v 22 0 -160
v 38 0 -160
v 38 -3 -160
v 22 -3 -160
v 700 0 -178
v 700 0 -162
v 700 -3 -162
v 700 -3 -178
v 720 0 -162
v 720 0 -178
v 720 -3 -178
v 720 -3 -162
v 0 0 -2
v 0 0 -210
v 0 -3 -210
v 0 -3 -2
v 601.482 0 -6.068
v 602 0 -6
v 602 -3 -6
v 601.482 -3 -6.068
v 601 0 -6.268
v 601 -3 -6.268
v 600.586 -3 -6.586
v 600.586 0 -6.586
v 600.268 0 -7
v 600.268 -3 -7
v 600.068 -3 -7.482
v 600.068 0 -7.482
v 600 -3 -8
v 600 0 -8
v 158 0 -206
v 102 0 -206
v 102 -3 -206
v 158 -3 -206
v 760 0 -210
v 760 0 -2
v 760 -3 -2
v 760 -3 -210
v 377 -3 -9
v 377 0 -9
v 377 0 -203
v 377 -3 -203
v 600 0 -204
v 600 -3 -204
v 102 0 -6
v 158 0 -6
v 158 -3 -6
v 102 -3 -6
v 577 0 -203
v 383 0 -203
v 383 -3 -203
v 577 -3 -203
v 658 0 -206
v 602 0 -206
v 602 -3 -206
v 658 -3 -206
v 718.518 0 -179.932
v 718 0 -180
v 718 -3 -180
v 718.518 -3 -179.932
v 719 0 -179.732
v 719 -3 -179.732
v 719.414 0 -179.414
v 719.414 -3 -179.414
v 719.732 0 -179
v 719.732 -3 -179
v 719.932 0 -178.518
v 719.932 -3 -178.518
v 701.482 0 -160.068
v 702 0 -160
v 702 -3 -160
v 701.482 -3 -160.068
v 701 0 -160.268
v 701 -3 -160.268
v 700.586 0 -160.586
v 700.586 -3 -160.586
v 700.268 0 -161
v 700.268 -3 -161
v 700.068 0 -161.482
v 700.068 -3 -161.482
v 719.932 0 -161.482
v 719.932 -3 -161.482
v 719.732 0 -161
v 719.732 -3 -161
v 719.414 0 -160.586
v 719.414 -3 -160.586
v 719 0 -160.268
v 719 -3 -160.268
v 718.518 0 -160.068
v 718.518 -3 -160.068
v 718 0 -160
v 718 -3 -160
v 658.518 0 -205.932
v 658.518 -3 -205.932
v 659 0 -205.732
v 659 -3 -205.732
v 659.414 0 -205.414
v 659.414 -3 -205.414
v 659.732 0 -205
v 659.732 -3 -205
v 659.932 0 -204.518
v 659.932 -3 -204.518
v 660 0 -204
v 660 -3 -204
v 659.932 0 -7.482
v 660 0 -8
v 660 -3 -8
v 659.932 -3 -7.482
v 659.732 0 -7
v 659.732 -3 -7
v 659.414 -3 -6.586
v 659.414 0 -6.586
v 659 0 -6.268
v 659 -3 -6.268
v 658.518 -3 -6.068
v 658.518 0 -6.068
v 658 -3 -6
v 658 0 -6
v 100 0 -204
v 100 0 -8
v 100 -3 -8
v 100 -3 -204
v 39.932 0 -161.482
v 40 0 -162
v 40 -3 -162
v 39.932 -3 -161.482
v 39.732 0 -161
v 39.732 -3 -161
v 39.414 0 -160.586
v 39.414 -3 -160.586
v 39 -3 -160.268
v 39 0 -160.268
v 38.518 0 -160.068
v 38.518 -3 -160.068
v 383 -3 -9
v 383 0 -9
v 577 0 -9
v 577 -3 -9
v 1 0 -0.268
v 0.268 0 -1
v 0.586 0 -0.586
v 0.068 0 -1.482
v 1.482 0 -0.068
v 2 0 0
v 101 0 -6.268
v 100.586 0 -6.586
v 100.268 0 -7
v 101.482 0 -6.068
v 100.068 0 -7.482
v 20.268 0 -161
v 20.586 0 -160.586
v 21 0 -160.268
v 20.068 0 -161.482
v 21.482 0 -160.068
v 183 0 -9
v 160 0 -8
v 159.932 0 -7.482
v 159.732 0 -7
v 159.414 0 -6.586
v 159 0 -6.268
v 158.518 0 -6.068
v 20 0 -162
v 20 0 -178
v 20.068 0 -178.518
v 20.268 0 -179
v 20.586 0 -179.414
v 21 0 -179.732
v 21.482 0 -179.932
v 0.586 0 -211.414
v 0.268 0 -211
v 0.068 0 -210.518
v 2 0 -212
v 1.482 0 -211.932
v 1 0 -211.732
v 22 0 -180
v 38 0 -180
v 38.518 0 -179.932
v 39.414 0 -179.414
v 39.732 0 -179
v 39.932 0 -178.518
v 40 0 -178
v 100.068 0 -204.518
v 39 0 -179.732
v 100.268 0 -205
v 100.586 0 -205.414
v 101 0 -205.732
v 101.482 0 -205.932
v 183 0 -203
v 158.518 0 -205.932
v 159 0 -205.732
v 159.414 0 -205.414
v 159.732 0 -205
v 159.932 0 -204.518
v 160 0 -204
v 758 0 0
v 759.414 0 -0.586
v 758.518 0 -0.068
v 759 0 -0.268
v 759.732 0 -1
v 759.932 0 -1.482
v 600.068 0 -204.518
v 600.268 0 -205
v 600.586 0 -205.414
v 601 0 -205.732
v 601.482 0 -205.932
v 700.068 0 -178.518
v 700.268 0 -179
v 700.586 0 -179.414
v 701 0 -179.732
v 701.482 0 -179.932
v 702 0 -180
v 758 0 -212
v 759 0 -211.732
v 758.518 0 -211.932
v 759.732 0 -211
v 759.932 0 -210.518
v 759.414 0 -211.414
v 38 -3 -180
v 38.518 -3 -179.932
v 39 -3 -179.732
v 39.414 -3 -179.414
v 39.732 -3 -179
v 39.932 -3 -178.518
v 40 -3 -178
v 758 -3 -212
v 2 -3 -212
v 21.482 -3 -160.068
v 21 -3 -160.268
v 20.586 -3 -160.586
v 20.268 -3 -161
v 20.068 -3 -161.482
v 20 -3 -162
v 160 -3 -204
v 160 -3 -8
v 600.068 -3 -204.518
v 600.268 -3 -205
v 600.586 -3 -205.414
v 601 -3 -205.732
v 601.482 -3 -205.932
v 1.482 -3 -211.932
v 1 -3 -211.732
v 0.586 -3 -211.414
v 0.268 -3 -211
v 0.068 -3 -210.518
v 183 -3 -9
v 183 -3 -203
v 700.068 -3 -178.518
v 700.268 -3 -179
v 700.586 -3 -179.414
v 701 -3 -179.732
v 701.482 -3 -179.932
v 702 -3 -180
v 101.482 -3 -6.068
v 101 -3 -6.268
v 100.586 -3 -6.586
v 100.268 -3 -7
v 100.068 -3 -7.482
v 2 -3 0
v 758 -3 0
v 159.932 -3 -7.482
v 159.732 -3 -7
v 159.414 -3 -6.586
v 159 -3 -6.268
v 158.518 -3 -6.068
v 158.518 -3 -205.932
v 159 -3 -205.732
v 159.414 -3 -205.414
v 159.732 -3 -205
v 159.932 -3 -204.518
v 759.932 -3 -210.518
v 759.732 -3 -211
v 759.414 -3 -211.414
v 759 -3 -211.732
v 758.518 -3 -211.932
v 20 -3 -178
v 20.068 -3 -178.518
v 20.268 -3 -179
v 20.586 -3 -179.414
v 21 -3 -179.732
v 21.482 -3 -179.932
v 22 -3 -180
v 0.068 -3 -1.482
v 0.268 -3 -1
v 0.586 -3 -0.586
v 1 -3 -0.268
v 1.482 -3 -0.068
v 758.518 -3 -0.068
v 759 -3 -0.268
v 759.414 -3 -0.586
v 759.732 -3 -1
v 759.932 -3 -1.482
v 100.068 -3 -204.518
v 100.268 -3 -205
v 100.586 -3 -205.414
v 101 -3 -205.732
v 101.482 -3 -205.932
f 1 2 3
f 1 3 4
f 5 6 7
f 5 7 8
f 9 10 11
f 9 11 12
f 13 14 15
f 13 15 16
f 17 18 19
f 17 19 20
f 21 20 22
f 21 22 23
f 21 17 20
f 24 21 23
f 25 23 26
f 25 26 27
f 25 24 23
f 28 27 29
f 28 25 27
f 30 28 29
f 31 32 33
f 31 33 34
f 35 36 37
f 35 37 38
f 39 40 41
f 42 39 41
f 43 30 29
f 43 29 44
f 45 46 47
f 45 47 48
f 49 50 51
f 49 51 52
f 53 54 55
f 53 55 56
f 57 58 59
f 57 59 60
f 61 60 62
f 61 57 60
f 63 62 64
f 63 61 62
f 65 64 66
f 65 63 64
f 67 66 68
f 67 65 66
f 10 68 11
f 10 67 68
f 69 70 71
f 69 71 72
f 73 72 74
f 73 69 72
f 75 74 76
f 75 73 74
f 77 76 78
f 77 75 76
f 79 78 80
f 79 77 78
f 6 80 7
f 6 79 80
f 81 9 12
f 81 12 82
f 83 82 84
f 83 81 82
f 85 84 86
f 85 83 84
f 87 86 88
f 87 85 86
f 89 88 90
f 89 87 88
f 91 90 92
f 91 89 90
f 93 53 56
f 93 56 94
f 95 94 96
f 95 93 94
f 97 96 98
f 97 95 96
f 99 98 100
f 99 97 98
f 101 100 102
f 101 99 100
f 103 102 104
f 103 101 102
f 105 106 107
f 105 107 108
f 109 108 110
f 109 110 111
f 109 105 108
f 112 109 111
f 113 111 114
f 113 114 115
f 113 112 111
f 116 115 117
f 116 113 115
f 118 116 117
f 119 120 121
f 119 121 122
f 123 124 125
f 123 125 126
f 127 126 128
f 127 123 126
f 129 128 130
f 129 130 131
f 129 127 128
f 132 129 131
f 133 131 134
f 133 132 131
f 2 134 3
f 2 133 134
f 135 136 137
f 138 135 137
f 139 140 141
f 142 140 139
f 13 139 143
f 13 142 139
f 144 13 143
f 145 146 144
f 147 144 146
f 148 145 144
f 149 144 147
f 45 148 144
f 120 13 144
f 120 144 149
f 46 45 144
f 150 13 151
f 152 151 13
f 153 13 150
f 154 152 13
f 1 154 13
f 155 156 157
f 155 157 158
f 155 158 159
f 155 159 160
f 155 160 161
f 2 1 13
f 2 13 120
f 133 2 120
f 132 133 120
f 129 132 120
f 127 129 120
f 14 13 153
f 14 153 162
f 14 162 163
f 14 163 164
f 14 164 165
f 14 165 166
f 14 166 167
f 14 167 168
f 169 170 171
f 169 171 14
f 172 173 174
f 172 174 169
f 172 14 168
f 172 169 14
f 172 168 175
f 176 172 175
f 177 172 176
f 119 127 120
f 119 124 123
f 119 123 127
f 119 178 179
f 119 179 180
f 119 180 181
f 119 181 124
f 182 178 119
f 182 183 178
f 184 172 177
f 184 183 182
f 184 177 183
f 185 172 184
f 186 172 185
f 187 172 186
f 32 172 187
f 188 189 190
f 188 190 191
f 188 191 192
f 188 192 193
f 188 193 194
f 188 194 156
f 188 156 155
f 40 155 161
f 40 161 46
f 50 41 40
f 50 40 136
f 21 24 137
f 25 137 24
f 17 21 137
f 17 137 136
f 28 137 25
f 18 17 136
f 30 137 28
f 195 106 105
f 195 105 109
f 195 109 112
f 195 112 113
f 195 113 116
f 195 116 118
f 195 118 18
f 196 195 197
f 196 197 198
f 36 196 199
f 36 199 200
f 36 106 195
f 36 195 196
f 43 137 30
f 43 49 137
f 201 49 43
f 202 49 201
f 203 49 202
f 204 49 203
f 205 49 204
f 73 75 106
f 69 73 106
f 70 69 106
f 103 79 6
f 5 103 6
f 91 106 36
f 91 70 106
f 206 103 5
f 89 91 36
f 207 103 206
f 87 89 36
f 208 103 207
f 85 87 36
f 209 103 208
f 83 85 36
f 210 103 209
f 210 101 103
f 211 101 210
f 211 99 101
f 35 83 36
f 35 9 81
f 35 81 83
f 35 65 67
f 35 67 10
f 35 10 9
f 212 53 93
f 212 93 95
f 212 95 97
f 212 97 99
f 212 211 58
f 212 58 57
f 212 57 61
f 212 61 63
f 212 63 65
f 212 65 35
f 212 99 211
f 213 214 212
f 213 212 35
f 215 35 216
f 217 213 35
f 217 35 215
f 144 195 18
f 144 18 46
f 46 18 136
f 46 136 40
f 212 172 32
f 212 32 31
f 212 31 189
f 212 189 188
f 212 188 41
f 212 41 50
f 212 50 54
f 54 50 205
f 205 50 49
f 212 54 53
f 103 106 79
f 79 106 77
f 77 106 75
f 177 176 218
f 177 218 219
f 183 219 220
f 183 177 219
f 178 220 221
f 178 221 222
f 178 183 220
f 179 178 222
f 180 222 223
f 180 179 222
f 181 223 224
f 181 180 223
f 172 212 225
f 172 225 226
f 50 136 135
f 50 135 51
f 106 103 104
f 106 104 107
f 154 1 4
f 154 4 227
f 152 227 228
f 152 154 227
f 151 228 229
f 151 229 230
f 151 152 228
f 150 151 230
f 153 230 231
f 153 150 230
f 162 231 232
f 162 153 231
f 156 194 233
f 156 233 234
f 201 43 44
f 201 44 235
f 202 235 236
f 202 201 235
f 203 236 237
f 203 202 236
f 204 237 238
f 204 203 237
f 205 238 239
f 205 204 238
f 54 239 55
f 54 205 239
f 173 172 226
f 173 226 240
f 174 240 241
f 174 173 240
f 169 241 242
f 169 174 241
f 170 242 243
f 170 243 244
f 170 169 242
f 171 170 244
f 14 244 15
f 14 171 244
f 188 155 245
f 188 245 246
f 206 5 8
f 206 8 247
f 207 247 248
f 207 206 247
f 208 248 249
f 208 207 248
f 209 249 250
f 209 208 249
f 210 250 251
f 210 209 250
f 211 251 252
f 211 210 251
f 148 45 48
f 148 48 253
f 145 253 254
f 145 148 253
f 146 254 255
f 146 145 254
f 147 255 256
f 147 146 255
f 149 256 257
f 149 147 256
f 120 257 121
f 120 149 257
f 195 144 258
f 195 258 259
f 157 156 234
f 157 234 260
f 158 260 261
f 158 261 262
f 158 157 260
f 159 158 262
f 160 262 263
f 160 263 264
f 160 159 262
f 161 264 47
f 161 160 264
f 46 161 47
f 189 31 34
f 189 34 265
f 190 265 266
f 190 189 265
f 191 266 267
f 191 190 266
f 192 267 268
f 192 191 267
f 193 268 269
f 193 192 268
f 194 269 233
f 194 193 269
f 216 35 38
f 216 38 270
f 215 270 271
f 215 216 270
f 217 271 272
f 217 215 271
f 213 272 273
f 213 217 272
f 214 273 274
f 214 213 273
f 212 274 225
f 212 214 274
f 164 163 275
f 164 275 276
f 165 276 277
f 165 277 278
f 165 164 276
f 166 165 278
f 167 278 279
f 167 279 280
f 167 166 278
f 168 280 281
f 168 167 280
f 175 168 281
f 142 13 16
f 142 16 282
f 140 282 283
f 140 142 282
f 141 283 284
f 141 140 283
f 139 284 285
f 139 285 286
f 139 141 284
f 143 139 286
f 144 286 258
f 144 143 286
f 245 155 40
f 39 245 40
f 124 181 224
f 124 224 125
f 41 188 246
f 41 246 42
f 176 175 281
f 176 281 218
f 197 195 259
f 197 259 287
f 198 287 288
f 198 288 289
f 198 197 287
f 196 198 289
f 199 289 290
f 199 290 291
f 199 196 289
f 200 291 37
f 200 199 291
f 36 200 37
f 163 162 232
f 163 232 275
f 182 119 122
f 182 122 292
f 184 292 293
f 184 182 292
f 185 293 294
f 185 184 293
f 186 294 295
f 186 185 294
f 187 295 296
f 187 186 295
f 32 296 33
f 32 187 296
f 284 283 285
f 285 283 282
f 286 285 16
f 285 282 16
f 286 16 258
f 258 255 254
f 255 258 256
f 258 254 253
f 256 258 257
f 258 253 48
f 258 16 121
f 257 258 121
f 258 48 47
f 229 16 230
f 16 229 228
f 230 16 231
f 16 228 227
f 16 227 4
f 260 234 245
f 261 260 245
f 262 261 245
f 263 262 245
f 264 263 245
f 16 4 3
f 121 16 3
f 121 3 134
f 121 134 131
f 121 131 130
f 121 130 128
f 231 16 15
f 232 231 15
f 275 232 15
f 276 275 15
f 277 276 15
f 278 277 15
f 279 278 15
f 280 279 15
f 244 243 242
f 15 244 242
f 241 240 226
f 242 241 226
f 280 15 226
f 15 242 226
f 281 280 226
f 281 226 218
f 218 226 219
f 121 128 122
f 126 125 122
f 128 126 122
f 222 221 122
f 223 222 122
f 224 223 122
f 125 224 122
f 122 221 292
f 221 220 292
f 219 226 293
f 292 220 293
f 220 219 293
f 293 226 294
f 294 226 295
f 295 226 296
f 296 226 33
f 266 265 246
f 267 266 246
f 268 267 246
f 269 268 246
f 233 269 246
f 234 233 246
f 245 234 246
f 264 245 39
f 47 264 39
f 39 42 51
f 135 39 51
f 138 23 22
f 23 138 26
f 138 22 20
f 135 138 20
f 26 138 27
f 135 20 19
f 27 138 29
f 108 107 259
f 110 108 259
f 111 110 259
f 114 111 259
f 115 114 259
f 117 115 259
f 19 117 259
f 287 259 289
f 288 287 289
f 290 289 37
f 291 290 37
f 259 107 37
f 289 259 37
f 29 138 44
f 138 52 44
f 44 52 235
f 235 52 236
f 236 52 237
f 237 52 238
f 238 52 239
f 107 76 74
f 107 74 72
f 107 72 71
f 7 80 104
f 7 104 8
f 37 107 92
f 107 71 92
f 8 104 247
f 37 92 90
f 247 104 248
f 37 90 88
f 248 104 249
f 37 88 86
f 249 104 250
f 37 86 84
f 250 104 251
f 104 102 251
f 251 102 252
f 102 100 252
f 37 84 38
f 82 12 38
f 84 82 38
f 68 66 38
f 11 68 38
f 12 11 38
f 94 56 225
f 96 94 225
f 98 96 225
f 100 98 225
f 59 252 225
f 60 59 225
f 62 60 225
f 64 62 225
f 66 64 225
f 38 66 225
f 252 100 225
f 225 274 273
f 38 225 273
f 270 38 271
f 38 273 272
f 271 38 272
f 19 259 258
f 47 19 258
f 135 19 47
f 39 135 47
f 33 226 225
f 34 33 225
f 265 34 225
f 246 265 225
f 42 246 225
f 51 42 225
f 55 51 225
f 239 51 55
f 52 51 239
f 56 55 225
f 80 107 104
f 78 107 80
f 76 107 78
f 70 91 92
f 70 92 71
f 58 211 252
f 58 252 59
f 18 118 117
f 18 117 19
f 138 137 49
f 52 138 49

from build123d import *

# Parameters (mm, degrees)
SKETCH_1_W      = 194
SKETCH_1_H      = 194
EXTRUDE_1_DEPTH = 3


with BuildPart() as part:
    # 草图1 → 凸台-拉伸1 (new body)
    with BuildSketch(Plane(origin=(0, 0, 0), x_dir=(1, 0, 0), z_dir=(0, 1, 0))):
        with BuildLine():
            Line((2, 0), (758, 0))
            ThreePointArc((758, 0), (759.414213562, 0.585786438), (760, 2))
            Line((760, 2), (760, 210))
            ThreePointArc((760, 210), (759.414213562, 211.414213562), (758, 212))
            Line((758, 212), (2, 212))
            ThreePointArc((2, 212), (0.585786438, 211.414213562), (0, 210))
            Line((0, 210), (0, 2))
            ThreePointArc((0, 2), (0.585786438, 0.585786438), (2, 0))
        make_face()
        with Locations((480, 106)):
            Rectangle(SKETCH_1_W, SKETCH_1_H, mode=Mode.SUBTRACT)
        with Locations((280, 106)):
            Rectangle(SKETCH_1_W, SKETCH_1_H, mode=Mode.SUBTRACT)
        with BuildLine():
            Line((658, 6), (602, 6))
            ThreePointArc((602, 6), (600.585786438, 6.585786438), (600, 8))
            Line((600, 8), (600, 204))
            ThreePointArc((600, 204), (600.585786438, 205.414213562), (602, 206))
            Line((602, 206), (658, 206))
            ThreePointArc((658, 206), (659.414213562, 205.414213562), (660, 204))
            Line((660, 204), (660, 8))
            ThreePointArc((660, 8), (659.414213562, 6.585786438), (658, 6))
        make_face(mode=Mode.SUBTRACT)
        with BuildLine():
            Line((158, 6), (102, 6))
            ThreePointArc((102, 6), (100.585786438, 6.585786438), (100, 8))
            Line((100, 8), (100, 204))
            ThreePointArc((100, 204), (100.585786438, 205.414213562), (102, 206))
            Line((102, 206), (158, 206))
            ThreePointArc((158, 206), (159.414213562, 205.414213562), (160, 204))
            Line((160, 204), (160, 8))
            ThreePointArc((160, 8), (159.414213562, 6.585786438), (158, 6))
        make_face(mode=Mode.SUBTRACT)
        with BuildLine():
            Line((718, 160), (702, 160))
            ThreePointArc((702, 160), (700.585786438, 160.585786438), (700, 162))
            Line((700, 162), (700, 178))
            ThreePointArc((700, 178), (700.585786438, 179.414213562), (702, 180))
            Line((702, 180), (718, 180))
            ThreePointArc((718, 180), (719.414213562, 179.414213562), (720, 178))
            Line((720, 178), (720, 162))
            ThreePointArc((720, 162), (719.414213562, 160.585786438), (718, 160))
        make_face(mode=Mode.SUBTRACT)
        with BuildLine():
            Line((38, 160), (22, 160))
            ThreePointArc((22, 160), (20.585786438, 160.585786438), (20, 162))
            Line((20, 162), (20, 178))
            ThreePointArc((20, 178), (20.585786438, 179.414213562), (22, 180))
            Line((22, 180), (38, 180))
            ThreePointArc((38, 180), (39.414213562, 179.414213562), (40, 178))
            Line((40, 178), (40, 162))
            ThreePointArc((40, 162), (39.414213562, 160.585786438), (38, 160))
        make_face(mode=Mode.SUBTRACT)
    extrude(amount=-EXTRUDE_1_DEPTH)


solid = part.part
